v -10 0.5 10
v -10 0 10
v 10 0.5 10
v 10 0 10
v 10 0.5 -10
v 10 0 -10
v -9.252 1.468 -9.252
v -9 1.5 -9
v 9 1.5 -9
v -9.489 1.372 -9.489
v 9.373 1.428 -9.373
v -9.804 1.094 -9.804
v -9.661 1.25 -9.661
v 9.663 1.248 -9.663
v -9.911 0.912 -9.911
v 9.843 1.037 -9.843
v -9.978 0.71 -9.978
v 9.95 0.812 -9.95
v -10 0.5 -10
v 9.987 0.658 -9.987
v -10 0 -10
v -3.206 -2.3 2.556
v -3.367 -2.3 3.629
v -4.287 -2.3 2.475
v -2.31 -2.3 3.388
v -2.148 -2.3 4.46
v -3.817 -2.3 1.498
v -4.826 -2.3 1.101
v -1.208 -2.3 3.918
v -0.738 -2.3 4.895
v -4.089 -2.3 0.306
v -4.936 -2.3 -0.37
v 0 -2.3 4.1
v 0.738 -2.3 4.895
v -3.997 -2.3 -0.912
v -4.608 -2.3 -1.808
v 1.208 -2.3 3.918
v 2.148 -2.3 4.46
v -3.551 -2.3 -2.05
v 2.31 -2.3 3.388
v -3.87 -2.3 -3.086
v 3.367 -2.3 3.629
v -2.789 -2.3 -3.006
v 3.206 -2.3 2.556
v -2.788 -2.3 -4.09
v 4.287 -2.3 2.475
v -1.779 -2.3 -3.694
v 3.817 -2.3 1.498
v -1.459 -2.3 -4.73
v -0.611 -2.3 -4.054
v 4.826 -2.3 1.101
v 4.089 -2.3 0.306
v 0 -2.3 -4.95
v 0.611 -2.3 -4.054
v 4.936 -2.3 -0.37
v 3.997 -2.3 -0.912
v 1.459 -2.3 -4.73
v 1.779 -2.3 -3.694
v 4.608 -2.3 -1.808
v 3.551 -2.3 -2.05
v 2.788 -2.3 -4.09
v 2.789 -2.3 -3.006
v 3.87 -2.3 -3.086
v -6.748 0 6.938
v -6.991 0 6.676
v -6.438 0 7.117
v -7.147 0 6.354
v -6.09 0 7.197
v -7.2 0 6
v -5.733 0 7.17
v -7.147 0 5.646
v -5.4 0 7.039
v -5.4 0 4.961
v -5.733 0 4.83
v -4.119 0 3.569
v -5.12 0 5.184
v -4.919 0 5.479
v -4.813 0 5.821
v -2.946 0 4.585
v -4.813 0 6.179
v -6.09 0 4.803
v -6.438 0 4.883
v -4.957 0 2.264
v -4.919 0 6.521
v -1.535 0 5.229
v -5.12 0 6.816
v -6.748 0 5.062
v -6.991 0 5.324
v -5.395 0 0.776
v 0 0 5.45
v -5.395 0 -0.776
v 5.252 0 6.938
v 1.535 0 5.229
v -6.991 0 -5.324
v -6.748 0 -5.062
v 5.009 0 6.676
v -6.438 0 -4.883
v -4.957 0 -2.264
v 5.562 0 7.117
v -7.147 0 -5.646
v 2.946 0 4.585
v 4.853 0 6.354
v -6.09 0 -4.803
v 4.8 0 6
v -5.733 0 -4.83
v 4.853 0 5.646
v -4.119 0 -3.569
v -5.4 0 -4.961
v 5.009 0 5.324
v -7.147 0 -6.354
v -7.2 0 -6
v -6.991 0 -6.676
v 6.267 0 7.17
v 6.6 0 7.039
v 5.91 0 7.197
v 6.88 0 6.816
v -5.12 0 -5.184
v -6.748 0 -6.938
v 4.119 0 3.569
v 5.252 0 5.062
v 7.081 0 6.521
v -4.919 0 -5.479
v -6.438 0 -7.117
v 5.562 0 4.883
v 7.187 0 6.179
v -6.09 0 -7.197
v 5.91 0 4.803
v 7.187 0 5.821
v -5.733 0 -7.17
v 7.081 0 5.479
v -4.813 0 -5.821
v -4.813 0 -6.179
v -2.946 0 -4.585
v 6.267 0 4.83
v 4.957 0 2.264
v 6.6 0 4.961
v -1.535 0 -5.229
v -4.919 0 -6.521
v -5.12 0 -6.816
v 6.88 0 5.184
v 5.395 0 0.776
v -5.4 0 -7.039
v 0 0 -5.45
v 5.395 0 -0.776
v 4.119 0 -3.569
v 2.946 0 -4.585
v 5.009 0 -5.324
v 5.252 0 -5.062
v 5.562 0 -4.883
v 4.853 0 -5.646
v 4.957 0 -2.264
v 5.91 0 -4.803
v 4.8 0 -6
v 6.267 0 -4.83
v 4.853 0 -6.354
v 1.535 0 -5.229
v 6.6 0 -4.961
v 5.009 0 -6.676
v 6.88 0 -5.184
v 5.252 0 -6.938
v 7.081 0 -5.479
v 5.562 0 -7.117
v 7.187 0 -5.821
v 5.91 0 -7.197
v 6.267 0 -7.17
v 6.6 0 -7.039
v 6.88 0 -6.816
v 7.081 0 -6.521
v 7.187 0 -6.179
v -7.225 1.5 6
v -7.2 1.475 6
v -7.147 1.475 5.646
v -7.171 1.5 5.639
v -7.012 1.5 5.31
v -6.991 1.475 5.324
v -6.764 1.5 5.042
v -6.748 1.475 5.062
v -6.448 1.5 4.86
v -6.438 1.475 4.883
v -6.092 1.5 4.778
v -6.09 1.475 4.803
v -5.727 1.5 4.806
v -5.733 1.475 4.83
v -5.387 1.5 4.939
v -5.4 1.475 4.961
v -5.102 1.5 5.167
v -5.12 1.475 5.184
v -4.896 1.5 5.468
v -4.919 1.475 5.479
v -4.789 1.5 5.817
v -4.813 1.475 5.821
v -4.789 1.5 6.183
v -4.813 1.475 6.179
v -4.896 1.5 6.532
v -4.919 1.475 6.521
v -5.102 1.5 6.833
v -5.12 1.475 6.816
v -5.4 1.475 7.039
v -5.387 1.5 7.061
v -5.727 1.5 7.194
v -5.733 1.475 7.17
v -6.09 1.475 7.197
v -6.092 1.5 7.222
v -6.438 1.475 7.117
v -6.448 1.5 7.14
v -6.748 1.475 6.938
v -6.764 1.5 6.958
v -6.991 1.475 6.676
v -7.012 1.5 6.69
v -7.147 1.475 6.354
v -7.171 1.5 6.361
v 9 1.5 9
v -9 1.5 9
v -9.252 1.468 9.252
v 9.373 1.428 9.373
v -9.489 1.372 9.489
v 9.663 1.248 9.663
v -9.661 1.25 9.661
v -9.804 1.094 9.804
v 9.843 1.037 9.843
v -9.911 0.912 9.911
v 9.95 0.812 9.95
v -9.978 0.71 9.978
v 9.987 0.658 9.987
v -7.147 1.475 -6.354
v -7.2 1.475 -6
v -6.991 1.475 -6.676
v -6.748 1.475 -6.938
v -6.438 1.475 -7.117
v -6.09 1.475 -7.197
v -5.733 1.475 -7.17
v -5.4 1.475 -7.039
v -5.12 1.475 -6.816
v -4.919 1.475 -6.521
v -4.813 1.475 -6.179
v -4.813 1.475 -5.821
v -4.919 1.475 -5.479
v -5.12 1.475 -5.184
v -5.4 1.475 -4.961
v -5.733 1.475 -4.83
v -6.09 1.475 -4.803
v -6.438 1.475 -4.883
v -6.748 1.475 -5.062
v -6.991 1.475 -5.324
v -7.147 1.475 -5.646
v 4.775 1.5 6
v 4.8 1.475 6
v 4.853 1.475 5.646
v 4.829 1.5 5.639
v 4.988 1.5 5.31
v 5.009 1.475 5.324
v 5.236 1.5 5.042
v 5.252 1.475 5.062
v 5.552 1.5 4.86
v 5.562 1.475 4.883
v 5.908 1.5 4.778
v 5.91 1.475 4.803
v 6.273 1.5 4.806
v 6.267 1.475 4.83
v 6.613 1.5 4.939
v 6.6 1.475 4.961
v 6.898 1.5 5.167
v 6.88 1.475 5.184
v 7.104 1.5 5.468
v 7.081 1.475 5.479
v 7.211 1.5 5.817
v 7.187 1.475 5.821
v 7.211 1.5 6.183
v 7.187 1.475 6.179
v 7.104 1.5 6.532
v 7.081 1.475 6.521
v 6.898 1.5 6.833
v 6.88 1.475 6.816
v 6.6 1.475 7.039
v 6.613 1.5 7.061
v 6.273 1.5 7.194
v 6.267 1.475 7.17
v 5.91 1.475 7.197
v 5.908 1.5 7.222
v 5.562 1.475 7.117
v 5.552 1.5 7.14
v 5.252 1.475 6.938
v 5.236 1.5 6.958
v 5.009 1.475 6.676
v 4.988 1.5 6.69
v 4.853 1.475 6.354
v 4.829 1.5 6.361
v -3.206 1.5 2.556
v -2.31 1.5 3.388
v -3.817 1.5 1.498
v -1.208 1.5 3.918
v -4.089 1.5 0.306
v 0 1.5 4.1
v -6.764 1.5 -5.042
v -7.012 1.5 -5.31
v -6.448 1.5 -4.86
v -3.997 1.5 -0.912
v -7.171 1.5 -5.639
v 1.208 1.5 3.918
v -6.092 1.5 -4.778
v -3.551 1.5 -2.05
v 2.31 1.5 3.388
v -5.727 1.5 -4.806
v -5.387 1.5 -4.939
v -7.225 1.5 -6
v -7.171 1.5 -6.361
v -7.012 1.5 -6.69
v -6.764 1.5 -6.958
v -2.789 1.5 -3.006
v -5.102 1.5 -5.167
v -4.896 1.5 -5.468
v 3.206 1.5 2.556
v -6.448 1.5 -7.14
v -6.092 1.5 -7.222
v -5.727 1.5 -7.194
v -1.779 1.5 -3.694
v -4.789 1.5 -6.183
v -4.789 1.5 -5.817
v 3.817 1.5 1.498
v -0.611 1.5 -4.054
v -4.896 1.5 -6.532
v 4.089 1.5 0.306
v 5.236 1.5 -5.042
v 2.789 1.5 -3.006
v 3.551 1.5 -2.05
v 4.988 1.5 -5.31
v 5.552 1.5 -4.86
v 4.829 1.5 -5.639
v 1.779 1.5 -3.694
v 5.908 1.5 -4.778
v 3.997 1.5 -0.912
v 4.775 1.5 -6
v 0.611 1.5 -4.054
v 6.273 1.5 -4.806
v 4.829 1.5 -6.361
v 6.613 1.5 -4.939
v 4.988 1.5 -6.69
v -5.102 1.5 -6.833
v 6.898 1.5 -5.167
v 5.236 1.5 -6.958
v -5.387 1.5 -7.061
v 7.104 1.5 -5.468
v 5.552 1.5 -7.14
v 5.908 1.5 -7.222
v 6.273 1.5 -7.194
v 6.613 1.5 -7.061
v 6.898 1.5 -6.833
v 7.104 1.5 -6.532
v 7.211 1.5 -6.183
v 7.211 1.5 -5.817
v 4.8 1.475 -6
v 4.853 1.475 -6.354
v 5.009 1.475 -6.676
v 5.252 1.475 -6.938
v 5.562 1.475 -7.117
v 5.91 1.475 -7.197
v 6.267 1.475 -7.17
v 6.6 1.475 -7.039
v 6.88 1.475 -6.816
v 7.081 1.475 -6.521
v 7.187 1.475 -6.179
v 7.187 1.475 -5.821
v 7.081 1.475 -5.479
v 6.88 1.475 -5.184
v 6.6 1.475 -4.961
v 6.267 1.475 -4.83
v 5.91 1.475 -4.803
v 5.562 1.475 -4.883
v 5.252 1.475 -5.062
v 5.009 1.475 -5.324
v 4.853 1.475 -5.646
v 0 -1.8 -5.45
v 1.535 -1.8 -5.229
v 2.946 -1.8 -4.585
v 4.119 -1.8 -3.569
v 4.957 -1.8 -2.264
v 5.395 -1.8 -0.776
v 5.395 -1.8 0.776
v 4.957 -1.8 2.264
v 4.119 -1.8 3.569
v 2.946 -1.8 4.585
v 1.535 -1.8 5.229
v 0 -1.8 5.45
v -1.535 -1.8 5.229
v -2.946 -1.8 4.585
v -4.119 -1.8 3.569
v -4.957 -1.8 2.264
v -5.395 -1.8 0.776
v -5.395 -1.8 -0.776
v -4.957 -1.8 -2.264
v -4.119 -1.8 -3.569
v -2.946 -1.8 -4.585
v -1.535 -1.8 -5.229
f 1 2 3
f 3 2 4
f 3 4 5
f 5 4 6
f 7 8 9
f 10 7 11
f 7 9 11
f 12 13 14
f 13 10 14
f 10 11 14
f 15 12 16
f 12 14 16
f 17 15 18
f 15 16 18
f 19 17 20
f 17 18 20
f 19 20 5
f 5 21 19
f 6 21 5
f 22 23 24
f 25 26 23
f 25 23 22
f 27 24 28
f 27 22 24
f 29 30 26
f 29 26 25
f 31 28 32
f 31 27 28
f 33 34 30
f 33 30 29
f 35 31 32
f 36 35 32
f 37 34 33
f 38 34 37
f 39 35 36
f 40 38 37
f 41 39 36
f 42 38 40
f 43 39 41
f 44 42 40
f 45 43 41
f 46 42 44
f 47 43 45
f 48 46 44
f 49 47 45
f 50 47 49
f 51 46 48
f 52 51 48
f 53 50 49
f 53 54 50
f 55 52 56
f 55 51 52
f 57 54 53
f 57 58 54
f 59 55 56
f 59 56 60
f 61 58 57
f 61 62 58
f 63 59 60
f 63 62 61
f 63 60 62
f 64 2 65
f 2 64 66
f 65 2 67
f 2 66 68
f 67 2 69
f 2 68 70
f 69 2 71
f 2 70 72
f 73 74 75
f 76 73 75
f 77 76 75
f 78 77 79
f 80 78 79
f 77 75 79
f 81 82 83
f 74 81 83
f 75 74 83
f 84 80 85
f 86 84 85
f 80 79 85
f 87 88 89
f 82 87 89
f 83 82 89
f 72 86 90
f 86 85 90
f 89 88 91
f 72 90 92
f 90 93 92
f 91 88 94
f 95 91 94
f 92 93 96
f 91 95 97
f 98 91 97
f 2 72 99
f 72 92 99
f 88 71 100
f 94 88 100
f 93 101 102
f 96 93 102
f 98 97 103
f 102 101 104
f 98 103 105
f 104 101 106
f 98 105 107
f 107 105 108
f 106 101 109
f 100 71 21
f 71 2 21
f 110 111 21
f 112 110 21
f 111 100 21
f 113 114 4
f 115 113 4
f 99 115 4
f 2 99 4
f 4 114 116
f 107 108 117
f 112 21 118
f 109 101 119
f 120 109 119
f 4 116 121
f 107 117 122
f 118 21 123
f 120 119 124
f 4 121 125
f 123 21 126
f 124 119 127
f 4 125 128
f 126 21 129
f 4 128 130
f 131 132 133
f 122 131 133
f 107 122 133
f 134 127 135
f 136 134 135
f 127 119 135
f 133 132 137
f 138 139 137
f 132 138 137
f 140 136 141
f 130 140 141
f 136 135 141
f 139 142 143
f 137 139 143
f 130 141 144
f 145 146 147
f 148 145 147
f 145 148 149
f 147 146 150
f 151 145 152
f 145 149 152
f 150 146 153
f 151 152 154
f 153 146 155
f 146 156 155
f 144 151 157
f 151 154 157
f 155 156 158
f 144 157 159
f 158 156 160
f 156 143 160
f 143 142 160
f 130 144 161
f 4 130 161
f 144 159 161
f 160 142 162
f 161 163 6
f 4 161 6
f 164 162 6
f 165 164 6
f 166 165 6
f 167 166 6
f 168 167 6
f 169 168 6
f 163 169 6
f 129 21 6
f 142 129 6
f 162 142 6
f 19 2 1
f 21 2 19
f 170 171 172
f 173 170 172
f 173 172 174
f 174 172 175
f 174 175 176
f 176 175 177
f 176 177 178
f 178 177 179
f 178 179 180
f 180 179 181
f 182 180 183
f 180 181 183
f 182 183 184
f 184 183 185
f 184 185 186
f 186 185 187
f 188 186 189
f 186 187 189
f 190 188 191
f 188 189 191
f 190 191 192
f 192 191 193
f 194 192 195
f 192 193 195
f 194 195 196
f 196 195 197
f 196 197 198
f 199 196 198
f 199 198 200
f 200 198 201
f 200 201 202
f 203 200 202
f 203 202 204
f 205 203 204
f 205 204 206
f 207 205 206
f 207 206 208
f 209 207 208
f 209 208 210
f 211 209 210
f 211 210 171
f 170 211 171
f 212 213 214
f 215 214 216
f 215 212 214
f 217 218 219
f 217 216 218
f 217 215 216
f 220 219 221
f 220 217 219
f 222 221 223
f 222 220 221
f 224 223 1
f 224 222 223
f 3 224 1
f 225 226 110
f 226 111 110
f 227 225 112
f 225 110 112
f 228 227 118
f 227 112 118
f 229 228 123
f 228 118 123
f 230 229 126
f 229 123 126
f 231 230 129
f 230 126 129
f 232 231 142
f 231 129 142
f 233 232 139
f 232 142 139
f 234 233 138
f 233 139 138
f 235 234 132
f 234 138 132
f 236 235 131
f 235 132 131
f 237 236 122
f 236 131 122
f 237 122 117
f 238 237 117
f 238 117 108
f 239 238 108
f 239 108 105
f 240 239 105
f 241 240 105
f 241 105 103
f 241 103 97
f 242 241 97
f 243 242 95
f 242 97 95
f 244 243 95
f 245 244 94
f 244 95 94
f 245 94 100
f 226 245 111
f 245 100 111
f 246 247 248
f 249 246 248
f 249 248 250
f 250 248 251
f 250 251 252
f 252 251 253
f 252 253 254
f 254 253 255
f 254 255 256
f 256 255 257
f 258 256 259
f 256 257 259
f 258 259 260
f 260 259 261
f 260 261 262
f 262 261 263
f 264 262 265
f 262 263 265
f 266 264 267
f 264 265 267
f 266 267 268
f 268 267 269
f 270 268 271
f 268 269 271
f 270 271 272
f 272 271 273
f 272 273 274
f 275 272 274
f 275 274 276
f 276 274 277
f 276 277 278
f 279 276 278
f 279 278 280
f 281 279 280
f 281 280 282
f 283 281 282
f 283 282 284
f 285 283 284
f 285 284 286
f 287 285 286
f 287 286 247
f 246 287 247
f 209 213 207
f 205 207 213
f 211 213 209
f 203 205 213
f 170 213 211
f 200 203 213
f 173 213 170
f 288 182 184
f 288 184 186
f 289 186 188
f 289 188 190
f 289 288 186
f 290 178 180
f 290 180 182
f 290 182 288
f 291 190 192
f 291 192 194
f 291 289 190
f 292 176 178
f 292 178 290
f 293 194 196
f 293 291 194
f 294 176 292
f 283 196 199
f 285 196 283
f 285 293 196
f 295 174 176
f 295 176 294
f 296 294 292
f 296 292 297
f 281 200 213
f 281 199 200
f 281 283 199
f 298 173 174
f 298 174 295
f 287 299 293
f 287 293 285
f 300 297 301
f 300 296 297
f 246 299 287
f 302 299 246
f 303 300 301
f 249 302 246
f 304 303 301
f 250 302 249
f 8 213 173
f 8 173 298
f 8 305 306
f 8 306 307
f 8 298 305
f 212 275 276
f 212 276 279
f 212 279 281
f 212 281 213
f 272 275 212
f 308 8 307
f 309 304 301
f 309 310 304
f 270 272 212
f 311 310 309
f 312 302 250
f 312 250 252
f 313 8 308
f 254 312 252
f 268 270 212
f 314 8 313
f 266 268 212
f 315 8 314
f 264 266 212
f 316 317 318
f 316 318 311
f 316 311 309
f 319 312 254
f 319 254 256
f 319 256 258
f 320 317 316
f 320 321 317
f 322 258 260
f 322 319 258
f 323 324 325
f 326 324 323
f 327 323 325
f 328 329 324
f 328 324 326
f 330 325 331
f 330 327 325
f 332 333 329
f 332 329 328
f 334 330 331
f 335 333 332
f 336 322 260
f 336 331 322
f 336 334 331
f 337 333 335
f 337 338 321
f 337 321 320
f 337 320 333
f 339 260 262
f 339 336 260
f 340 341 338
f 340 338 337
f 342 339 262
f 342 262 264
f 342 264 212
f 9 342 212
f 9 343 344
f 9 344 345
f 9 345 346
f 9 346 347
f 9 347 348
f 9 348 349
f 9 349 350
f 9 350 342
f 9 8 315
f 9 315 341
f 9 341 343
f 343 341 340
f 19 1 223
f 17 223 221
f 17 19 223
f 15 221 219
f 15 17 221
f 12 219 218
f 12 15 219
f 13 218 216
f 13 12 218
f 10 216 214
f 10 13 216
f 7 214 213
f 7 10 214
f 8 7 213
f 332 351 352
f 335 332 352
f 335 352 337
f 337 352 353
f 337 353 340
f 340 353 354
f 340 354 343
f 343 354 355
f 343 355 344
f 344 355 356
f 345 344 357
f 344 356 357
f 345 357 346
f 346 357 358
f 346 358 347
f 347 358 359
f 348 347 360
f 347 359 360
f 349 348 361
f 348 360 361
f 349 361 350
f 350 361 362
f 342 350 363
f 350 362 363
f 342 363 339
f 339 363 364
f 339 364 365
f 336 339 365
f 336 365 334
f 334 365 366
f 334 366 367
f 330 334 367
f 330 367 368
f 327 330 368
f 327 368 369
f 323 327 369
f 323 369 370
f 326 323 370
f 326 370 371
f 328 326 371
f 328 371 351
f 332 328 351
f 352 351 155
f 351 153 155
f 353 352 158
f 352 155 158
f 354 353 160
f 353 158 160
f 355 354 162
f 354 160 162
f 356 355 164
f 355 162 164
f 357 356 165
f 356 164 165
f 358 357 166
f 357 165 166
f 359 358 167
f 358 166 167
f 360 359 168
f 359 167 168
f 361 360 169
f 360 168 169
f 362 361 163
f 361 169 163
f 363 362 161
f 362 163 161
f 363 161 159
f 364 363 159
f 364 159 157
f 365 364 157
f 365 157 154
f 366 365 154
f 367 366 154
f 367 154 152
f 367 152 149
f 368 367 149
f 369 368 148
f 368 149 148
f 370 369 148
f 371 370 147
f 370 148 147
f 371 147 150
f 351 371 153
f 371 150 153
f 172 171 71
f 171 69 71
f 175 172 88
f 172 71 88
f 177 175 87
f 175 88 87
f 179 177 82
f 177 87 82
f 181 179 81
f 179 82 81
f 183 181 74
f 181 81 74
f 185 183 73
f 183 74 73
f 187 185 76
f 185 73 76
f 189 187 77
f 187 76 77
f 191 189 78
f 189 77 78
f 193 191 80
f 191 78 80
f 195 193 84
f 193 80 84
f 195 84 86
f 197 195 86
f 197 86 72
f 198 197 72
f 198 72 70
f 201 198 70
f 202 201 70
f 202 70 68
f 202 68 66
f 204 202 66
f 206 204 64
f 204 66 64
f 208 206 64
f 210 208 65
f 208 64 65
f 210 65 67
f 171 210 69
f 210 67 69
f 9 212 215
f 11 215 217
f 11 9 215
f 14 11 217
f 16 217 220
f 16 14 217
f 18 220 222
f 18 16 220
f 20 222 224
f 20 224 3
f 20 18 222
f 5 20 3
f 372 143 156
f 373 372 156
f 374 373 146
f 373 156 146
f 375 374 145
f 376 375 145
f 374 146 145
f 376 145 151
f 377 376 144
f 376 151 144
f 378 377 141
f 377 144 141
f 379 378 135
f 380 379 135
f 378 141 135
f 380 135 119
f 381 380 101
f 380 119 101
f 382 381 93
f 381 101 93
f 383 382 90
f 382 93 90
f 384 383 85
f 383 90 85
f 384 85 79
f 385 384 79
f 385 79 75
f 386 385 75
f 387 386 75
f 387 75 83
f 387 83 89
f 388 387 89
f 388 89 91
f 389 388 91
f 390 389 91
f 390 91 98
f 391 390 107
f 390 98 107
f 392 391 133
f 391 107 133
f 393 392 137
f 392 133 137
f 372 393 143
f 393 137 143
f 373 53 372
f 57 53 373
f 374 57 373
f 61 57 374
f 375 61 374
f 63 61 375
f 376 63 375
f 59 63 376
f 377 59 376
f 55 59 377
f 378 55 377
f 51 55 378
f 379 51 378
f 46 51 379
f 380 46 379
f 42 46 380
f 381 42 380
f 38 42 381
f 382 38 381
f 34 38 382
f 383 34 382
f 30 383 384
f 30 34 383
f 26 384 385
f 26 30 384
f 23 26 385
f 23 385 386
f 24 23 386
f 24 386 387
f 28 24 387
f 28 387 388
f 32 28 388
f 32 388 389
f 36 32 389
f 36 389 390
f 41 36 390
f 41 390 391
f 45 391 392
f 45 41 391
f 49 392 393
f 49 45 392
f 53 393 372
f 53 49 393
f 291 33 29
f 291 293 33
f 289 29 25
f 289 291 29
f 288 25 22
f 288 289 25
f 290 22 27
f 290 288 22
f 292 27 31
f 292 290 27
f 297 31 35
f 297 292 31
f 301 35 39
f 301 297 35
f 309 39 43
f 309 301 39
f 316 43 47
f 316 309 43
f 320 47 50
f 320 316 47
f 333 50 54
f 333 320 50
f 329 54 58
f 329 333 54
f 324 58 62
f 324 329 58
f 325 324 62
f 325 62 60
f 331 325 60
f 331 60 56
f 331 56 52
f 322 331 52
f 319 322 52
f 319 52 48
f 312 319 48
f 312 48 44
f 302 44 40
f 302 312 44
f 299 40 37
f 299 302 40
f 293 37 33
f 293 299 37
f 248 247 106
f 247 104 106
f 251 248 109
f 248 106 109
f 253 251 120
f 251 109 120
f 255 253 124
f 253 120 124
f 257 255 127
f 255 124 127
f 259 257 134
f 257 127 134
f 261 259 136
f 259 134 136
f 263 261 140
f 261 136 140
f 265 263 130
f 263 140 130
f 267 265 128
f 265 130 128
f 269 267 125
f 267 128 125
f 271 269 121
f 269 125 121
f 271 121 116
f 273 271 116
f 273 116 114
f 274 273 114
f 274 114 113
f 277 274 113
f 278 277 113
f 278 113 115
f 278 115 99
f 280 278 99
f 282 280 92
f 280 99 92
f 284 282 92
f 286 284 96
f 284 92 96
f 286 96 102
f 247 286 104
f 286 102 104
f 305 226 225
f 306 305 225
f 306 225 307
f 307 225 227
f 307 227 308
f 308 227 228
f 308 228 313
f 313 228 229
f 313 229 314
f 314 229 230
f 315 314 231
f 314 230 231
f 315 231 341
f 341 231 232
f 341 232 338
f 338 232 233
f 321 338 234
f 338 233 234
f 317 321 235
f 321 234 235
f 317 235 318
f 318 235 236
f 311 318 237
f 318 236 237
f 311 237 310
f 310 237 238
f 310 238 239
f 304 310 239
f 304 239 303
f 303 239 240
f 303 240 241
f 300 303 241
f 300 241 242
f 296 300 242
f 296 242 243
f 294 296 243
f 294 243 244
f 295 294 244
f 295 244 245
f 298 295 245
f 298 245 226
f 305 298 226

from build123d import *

# Parameters (mm, degrees)
SKETCH1_W                      = 20
SKETCH1_H                      = 20
BOSS_EXTRUDE1_DEPTH            = 1.5
M2_CLEARANCE_HOLE1_D           = 2.4
M2_CLEARANCE_HOLE1_CSINK_D     = 2.45
M2_CLEARANCE_HOLE1_CSINK_ANGLE = 90
FILLET1_R                      = 1
CUT_EXTRUDE1_REACH             = 16.221
SKETCH2_R                      = 4.1
SKETCH6_R                      = 5.45
SKETCH6_R_2                    = 4.1
BOSS_EXTRUDE2_DEPTH            = 2.3
CHAMFER1_SIZE                  = 0.5


with BuildPart() as part:
    # Sketch1 → Boss-Extrude1 (new body)
    with BuildSketch(Plane(origin=(0, 0, 0), x_dir=(1, 0, 0), z_dir=(0, 1, 0))):
        Rectangle(SKETCH1_W, SKETCH1_H)
    extrude(amount=BOSS_EXTRUDE1_DEPTH)

    # M2 Clearance Hole1 (through all)
    with Locations(Plane(origin=(0, 1.5, 0), x_dir=(1, 0, 0), z_dir=(0, 1, 0))):
        with Locations((-6, 6), (6, 6), (-6, -6), (6, -6)):
            CounterSinkHole(M2_CLEARANCE_HOLE1_D / 2, M2_CLEARANCE_HOLE1_CSINK_D / 2, counter_sink_angle=M2_CLEARANCE_HOLE1_CSINK_ANGLE)

    # Fillet1
    fillet1_edges = [part.edges().sort_by_distance(p)[0] for p in [
        (-10, 1.5, 0),
        (0, 1.5, 10),
        (10, 1.5, 0),
        (0, 1.5, -10),
    ]]
    fillet(fillet1_edges, radius=FILLET1_R)

    # Sketch2 → Cut-Extrude1 (cut, up to next)
    with BuildSketch(Plane(origin=(0, 1.5, 0), x_dir=(1, 0, 0), z_dir=(0, 1, 0)), mode=Mode.PRIVATE) as cut_extrude1_sk1:
        with Locations(Location((0, 0, 0), (0, 0, 270))):
            Circle(SKETCH2_R)
    cut_extrude1_tool1 = extrude(cut_extrude1_sk1.sketch, amount=-CUT_EXTRUDE1_REACH, mode=Mode.PRIVATE) & part.part
    add(cut_extrude1_tool1.solids().sort_by_distance((0, 1.5, 0))[0], mode=Mode.SUBTRACT)

    # Sketch6 → Boss-Extrude2 (add)
    with BuildSketch(Plane.XZ):
        with Locations(Location((0, 0, 0), (0, 0, 270))):
            Circle(SKETCH6_R)
        with Locations(Location((0, 0, 0), (0, 0, 90))):
            Circle(SKETCH6_R_2, mode=Mode.SUBTRACT)
    extrude(amount=BOSS_EXTRUDE2_DEPTH)

    # Chamfer1
    chamfer1_edges = [part.edges().sort_by_distance(p)[0] for p in [
        (0, -2.3, 5.45),
    ]]
    chamfer(chamfer1_edges, length=CHAMFER1_SIZE)


solid = part.part
